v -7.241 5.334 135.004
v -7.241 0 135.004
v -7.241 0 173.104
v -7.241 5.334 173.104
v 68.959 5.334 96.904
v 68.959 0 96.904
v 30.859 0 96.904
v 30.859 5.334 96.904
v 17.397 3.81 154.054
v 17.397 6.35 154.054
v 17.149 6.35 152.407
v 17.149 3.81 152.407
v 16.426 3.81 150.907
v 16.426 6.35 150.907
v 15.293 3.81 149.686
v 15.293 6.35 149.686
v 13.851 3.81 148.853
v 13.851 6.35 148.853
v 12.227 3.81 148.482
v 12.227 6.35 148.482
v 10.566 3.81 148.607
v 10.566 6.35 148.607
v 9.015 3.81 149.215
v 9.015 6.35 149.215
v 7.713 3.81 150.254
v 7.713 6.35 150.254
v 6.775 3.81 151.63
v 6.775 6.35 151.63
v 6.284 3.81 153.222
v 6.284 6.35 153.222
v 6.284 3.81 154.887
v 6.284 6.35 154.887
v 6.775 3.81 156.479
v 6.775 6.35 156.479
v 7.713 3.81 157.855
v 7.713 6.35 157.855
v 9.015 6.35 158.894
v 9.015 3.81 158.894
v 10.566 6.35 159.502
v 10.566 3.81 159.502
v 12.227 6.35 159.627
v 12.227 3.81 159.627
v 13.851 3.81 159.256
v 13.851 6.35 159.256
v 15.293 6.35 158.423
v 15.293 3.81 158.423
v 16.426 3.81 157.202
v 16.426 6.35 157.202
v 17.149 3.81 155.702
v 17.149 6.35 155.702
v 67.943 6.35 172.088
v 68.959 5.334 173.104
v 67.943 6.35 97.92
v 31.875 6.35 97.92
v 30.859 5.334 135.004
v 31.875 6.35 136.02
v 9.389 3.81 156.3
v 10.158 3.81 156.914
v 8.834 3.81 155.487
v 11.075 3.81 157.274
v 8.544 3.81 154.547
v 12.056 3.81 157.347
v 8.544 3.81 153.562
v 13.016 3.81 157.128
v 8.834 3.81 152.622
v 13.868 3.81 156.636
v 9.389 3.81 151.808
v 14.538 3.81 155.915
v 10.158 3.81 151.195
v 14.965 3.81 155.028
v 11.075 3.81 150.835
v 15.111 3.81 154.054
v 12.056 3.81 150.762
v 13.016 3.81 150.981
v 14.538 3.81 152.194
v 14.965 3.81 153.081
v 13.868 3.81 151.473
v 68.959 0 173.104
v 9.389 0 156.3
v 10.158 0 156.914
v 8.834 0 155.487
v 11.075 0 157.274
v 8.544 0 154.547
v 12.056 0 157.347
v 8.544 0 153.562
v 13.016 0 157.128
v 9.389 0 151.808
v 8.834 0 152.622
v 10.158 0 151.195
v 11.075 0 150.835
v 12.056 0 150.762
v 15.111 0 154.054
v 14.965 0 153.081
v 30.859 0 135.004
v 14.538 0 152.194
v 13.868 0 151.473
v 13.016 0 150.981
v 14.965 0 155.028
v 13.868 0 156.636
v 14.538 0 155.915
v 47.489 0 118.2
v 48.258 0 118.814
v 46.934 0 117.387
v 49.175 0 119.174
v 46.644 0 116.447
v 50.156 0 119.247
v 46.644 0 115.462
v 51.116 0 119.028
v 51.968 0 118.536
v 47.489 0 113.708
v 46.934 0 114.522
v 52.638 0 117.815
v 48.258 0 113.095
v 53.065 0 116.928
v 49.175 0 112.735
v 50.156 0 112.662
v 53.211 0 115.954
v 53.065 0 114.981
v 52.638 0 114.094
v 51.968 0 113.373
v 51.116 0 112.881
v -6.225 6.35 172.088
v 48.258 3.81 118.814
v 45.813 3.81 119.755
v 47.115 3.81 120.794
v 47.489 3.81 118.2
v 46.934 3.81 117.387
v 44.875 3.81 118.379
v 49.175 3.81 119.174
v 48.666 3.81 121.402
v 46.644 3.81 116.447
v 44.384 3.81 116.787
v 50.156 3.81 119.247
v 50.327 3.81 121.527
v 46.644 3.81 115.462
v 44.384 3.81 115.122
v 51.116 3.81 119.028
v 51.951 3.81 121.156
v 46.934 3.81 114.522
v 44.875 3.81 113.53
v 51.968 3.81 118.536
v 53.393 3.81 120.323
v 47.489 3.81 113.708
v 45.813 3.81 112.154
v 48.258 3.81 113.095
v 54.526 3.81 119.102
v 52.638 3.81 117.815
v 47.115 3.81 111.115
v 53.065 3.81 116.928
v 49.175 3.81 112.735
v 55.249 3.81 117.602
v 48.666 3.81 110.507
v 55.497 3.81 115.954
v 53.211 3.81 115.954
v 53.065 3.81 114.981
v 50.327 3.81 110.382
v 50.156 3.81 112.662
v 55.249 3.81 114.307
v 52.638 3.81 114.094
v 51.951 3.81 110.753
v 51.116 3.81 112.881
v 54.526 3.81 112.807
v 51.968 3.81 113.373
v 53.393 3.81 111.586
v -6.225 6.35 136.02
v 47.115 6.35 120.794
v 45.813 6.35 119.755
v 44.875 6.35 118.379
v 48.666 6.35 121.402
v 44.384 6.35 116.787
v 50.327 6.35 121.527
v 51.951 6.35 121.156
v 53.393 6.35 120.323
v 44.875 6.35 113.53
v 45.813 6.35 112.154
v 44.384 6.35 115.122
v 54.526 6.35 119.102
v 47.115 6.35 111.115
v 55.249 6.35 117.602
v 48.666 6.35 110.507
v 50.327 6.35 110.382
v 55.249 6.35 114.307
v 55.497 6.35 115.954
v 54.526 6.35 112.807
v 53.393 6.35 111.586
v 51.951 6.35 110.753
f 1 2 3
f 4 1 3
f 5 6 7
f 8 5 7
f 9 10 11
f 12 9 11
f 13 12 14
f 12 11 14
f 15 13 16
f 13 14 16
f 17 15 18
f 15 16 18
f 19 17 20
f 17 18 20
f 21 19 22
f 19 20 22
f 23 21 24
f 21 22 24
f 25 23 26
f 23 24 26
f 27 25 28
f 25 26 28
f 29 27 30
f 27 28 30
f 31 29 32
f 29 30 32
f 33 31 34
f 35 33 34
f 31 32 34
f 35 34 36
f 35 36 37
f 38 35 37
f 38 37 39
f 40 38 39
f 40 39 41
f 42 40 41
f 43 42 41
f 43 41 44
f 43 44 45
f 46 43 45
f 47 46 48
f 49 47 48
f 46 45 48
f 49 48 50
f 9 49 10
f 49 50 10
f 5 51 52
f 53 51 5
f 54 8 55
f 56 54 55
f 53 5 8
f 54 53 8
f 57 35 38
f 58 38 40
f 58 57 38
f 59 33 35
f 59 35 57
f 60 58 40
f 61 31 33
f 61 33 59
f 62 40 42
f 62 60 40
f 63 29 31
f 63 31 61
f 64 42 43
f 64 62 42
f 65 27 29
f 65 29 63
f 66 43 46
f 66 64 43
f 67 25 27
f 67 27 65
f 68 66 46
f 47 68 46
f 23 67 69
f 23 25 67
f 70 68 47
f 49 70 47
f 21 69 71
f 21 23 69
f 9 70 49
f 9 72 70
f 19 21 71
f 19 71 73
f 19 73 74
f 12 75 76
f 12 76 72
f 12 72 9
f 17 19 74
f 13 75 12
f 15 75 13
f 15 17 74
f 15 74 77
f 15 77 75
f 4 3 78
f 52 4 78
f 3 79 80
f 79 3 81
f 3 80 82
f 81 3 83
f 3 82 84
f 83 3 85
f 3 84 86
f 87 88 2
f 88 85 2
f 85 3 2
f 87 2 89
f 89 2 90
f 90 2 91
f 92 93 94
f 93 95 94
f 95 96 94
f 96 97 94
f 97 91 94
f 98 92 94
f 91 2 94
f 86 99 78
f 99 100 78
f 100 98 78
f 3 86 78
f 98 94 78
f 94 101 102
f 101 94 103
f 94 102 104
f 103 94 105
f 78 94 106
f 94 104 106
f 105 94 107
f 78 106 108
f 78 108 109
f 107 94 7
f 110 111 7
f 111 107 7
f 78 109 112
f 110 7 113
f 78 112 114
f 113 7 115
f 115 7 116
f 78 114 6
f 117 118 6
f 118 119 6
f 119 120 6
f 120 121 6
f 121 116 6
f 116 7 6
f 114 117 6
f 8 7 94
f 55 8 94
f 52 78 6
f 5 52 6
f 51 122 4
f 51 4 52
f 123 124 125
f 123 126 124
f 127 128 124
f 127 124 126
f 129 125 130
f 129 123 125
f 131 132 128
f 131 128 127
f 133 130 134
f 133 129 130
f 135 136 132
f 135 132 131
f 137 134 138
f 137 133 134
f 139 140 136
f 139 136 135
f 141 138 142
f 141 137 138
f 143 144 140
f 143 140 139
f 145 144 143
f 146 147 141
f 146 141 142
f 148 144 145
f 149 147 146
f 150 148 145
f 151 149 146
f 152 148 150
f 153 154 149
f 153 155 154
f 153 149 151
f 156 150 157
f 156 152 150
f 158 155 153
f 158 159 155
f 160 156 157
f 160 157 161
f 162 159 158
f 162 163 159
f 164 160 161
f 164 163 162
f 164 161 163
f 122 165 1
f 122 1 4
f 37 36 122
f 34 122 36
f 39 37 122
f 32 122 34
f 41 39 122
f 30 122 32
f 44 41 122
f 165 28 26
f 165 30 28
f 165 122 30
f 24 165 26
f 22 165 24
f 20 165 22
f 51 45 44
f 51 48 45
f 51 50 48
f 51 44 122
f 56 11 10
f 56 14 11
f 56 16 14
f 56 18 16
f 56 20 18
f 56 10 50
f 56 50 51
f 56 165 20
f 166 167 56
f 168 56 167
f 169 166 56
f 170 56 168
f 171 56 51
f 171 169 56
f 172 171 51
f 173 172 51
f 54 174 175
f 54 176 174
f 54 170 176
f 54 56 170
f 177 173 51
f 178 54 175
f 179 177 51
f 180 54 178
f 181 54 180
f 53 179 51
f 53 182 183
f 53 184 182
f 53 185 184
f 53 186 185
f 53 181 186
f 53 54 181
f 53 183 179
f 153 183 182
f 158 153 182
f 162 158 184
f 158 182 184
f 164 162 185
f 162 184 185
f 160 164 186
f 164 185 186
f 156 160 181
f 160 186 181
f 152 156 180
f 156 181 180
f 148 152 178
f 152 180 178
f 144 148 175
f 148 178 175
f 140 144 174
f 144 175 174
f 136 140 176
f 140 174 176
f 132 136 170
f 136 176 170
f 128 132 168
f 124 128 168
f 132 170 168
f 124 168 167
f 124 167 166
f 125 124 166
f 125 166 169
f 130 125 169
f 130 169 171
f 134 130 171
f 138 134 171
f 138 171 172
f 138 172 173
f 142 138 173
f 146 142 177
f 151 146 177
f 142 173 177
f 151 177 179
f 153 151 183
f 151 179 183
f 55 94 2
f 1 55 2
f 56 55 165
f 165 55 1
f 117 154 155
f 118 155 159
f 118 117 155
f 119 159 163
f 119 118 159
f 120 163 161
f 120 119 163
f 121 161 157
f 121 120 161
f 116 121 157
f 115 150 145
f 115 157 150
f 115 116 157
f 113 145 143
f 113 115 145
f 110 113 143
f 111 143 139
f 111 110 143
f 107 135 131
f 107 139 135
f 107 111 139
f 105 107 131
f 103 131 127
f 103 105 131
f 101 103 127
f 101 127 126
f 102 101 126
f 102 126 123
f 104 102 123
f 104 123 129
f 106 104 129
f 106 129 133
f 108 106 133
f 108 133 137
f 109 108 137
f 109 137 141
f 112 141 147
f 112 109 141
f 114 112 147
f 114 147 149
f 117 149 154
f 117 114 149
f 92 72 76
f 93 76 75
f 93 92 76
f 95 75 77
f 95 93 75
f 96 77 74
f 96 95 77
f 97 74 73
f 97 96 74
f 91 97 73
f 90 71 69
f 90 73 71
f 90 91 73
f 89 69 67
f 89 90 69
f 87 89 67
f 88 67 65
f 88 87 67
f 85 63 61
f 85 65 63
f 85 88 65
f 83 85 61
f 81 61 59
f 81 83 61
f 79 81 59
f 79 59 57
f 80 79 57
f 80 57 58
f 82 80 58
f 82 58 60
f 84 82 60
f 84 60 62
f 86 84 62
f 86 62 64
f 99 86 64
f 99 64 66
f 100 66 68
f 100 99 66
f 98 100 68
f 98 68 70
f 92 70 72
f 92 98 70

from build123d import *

# Parameters (mm, degrees)
BOSS_EXTRUDE1_DEPTH = 6.35
SKETCH3_R           = 3.302
CUT_EXTRUDE2_DEPTH  = 6.35
SKETCH4_R           = 5.588
CUT_EXTRUDE3_DEPTH  = 2.54
CHAMFER1_SIZE       = 1.016


with BuildPart() as part:
    # Sketch1 → Boss-Extrude1 (new body)
    with BuildSketch(Plane(origin=(0, 0, 0), x_dir=(1, 0, 0), z_dir=(0, 1, 0))):
        Polygon((-7.240727314, -173.10442994), (68.959272686, -173.10442994), (68.959272686, -96.90442994), (30.859272686, -96.90442994), (30.859272686, -135.00442994), (-7.240727314, -135.00442994), align=None)
    extrude(amount=BOSS_EXTRUDE1_DEPTH)

    # Sketch3 → Cut-Extrude2 (cut)
    with BuildSketch(Plane(origin=(0, 0, 0), x_dir=(1, 0, 0), z_dir=(0, 1, 0))):
        with Locations((11.809272686, -154.05442994)):
            Circle(SKETCH3_R)
        with Locations((49.909272686, -115.95442994)):
            Circle(SKETCH3_R)
    extrude(amount=CUT_EXTRUDE2_DEPTH, mode=Mode.SUBTRACT)

    # Sketch4 → Cut-Extrude3 (cut)
    with BuildSketch(Plane(origin=(0, 6.35, 0), x_dir=(1, 0, 0), z_dir=(0, 1, 0))):
        with Locations((11.809272686, -154.05442994)):
            Circle(SKETCH4_R)
        with Locations((49.909272686, -115.95442994)):
            Circle(SKETCH4_R)
    extrude(amount=-CUT_EXTRUDE3_DEPTH, mode=Mode.SUBTRACT)

    # Chamfer1
    chamfer1_edges = [part.edges().sort_by_distance(p)[0] for p in [
        (11.809272686, 6.35, 135.00442994),
        (-7.240727314, 6.35, 154.05442994),
        (30.859272686, 6.35, 173.10442994),
        (68.959272686, 6.35, 135.00442994),
        (49.909272686, 6.35, 96.90442994),
        (30.859272686, 6.35, 115.95442994),
    ]]
    chamfer(chamfer1_edges, length=CHAMFER1_SIZE)


solid = part.part
